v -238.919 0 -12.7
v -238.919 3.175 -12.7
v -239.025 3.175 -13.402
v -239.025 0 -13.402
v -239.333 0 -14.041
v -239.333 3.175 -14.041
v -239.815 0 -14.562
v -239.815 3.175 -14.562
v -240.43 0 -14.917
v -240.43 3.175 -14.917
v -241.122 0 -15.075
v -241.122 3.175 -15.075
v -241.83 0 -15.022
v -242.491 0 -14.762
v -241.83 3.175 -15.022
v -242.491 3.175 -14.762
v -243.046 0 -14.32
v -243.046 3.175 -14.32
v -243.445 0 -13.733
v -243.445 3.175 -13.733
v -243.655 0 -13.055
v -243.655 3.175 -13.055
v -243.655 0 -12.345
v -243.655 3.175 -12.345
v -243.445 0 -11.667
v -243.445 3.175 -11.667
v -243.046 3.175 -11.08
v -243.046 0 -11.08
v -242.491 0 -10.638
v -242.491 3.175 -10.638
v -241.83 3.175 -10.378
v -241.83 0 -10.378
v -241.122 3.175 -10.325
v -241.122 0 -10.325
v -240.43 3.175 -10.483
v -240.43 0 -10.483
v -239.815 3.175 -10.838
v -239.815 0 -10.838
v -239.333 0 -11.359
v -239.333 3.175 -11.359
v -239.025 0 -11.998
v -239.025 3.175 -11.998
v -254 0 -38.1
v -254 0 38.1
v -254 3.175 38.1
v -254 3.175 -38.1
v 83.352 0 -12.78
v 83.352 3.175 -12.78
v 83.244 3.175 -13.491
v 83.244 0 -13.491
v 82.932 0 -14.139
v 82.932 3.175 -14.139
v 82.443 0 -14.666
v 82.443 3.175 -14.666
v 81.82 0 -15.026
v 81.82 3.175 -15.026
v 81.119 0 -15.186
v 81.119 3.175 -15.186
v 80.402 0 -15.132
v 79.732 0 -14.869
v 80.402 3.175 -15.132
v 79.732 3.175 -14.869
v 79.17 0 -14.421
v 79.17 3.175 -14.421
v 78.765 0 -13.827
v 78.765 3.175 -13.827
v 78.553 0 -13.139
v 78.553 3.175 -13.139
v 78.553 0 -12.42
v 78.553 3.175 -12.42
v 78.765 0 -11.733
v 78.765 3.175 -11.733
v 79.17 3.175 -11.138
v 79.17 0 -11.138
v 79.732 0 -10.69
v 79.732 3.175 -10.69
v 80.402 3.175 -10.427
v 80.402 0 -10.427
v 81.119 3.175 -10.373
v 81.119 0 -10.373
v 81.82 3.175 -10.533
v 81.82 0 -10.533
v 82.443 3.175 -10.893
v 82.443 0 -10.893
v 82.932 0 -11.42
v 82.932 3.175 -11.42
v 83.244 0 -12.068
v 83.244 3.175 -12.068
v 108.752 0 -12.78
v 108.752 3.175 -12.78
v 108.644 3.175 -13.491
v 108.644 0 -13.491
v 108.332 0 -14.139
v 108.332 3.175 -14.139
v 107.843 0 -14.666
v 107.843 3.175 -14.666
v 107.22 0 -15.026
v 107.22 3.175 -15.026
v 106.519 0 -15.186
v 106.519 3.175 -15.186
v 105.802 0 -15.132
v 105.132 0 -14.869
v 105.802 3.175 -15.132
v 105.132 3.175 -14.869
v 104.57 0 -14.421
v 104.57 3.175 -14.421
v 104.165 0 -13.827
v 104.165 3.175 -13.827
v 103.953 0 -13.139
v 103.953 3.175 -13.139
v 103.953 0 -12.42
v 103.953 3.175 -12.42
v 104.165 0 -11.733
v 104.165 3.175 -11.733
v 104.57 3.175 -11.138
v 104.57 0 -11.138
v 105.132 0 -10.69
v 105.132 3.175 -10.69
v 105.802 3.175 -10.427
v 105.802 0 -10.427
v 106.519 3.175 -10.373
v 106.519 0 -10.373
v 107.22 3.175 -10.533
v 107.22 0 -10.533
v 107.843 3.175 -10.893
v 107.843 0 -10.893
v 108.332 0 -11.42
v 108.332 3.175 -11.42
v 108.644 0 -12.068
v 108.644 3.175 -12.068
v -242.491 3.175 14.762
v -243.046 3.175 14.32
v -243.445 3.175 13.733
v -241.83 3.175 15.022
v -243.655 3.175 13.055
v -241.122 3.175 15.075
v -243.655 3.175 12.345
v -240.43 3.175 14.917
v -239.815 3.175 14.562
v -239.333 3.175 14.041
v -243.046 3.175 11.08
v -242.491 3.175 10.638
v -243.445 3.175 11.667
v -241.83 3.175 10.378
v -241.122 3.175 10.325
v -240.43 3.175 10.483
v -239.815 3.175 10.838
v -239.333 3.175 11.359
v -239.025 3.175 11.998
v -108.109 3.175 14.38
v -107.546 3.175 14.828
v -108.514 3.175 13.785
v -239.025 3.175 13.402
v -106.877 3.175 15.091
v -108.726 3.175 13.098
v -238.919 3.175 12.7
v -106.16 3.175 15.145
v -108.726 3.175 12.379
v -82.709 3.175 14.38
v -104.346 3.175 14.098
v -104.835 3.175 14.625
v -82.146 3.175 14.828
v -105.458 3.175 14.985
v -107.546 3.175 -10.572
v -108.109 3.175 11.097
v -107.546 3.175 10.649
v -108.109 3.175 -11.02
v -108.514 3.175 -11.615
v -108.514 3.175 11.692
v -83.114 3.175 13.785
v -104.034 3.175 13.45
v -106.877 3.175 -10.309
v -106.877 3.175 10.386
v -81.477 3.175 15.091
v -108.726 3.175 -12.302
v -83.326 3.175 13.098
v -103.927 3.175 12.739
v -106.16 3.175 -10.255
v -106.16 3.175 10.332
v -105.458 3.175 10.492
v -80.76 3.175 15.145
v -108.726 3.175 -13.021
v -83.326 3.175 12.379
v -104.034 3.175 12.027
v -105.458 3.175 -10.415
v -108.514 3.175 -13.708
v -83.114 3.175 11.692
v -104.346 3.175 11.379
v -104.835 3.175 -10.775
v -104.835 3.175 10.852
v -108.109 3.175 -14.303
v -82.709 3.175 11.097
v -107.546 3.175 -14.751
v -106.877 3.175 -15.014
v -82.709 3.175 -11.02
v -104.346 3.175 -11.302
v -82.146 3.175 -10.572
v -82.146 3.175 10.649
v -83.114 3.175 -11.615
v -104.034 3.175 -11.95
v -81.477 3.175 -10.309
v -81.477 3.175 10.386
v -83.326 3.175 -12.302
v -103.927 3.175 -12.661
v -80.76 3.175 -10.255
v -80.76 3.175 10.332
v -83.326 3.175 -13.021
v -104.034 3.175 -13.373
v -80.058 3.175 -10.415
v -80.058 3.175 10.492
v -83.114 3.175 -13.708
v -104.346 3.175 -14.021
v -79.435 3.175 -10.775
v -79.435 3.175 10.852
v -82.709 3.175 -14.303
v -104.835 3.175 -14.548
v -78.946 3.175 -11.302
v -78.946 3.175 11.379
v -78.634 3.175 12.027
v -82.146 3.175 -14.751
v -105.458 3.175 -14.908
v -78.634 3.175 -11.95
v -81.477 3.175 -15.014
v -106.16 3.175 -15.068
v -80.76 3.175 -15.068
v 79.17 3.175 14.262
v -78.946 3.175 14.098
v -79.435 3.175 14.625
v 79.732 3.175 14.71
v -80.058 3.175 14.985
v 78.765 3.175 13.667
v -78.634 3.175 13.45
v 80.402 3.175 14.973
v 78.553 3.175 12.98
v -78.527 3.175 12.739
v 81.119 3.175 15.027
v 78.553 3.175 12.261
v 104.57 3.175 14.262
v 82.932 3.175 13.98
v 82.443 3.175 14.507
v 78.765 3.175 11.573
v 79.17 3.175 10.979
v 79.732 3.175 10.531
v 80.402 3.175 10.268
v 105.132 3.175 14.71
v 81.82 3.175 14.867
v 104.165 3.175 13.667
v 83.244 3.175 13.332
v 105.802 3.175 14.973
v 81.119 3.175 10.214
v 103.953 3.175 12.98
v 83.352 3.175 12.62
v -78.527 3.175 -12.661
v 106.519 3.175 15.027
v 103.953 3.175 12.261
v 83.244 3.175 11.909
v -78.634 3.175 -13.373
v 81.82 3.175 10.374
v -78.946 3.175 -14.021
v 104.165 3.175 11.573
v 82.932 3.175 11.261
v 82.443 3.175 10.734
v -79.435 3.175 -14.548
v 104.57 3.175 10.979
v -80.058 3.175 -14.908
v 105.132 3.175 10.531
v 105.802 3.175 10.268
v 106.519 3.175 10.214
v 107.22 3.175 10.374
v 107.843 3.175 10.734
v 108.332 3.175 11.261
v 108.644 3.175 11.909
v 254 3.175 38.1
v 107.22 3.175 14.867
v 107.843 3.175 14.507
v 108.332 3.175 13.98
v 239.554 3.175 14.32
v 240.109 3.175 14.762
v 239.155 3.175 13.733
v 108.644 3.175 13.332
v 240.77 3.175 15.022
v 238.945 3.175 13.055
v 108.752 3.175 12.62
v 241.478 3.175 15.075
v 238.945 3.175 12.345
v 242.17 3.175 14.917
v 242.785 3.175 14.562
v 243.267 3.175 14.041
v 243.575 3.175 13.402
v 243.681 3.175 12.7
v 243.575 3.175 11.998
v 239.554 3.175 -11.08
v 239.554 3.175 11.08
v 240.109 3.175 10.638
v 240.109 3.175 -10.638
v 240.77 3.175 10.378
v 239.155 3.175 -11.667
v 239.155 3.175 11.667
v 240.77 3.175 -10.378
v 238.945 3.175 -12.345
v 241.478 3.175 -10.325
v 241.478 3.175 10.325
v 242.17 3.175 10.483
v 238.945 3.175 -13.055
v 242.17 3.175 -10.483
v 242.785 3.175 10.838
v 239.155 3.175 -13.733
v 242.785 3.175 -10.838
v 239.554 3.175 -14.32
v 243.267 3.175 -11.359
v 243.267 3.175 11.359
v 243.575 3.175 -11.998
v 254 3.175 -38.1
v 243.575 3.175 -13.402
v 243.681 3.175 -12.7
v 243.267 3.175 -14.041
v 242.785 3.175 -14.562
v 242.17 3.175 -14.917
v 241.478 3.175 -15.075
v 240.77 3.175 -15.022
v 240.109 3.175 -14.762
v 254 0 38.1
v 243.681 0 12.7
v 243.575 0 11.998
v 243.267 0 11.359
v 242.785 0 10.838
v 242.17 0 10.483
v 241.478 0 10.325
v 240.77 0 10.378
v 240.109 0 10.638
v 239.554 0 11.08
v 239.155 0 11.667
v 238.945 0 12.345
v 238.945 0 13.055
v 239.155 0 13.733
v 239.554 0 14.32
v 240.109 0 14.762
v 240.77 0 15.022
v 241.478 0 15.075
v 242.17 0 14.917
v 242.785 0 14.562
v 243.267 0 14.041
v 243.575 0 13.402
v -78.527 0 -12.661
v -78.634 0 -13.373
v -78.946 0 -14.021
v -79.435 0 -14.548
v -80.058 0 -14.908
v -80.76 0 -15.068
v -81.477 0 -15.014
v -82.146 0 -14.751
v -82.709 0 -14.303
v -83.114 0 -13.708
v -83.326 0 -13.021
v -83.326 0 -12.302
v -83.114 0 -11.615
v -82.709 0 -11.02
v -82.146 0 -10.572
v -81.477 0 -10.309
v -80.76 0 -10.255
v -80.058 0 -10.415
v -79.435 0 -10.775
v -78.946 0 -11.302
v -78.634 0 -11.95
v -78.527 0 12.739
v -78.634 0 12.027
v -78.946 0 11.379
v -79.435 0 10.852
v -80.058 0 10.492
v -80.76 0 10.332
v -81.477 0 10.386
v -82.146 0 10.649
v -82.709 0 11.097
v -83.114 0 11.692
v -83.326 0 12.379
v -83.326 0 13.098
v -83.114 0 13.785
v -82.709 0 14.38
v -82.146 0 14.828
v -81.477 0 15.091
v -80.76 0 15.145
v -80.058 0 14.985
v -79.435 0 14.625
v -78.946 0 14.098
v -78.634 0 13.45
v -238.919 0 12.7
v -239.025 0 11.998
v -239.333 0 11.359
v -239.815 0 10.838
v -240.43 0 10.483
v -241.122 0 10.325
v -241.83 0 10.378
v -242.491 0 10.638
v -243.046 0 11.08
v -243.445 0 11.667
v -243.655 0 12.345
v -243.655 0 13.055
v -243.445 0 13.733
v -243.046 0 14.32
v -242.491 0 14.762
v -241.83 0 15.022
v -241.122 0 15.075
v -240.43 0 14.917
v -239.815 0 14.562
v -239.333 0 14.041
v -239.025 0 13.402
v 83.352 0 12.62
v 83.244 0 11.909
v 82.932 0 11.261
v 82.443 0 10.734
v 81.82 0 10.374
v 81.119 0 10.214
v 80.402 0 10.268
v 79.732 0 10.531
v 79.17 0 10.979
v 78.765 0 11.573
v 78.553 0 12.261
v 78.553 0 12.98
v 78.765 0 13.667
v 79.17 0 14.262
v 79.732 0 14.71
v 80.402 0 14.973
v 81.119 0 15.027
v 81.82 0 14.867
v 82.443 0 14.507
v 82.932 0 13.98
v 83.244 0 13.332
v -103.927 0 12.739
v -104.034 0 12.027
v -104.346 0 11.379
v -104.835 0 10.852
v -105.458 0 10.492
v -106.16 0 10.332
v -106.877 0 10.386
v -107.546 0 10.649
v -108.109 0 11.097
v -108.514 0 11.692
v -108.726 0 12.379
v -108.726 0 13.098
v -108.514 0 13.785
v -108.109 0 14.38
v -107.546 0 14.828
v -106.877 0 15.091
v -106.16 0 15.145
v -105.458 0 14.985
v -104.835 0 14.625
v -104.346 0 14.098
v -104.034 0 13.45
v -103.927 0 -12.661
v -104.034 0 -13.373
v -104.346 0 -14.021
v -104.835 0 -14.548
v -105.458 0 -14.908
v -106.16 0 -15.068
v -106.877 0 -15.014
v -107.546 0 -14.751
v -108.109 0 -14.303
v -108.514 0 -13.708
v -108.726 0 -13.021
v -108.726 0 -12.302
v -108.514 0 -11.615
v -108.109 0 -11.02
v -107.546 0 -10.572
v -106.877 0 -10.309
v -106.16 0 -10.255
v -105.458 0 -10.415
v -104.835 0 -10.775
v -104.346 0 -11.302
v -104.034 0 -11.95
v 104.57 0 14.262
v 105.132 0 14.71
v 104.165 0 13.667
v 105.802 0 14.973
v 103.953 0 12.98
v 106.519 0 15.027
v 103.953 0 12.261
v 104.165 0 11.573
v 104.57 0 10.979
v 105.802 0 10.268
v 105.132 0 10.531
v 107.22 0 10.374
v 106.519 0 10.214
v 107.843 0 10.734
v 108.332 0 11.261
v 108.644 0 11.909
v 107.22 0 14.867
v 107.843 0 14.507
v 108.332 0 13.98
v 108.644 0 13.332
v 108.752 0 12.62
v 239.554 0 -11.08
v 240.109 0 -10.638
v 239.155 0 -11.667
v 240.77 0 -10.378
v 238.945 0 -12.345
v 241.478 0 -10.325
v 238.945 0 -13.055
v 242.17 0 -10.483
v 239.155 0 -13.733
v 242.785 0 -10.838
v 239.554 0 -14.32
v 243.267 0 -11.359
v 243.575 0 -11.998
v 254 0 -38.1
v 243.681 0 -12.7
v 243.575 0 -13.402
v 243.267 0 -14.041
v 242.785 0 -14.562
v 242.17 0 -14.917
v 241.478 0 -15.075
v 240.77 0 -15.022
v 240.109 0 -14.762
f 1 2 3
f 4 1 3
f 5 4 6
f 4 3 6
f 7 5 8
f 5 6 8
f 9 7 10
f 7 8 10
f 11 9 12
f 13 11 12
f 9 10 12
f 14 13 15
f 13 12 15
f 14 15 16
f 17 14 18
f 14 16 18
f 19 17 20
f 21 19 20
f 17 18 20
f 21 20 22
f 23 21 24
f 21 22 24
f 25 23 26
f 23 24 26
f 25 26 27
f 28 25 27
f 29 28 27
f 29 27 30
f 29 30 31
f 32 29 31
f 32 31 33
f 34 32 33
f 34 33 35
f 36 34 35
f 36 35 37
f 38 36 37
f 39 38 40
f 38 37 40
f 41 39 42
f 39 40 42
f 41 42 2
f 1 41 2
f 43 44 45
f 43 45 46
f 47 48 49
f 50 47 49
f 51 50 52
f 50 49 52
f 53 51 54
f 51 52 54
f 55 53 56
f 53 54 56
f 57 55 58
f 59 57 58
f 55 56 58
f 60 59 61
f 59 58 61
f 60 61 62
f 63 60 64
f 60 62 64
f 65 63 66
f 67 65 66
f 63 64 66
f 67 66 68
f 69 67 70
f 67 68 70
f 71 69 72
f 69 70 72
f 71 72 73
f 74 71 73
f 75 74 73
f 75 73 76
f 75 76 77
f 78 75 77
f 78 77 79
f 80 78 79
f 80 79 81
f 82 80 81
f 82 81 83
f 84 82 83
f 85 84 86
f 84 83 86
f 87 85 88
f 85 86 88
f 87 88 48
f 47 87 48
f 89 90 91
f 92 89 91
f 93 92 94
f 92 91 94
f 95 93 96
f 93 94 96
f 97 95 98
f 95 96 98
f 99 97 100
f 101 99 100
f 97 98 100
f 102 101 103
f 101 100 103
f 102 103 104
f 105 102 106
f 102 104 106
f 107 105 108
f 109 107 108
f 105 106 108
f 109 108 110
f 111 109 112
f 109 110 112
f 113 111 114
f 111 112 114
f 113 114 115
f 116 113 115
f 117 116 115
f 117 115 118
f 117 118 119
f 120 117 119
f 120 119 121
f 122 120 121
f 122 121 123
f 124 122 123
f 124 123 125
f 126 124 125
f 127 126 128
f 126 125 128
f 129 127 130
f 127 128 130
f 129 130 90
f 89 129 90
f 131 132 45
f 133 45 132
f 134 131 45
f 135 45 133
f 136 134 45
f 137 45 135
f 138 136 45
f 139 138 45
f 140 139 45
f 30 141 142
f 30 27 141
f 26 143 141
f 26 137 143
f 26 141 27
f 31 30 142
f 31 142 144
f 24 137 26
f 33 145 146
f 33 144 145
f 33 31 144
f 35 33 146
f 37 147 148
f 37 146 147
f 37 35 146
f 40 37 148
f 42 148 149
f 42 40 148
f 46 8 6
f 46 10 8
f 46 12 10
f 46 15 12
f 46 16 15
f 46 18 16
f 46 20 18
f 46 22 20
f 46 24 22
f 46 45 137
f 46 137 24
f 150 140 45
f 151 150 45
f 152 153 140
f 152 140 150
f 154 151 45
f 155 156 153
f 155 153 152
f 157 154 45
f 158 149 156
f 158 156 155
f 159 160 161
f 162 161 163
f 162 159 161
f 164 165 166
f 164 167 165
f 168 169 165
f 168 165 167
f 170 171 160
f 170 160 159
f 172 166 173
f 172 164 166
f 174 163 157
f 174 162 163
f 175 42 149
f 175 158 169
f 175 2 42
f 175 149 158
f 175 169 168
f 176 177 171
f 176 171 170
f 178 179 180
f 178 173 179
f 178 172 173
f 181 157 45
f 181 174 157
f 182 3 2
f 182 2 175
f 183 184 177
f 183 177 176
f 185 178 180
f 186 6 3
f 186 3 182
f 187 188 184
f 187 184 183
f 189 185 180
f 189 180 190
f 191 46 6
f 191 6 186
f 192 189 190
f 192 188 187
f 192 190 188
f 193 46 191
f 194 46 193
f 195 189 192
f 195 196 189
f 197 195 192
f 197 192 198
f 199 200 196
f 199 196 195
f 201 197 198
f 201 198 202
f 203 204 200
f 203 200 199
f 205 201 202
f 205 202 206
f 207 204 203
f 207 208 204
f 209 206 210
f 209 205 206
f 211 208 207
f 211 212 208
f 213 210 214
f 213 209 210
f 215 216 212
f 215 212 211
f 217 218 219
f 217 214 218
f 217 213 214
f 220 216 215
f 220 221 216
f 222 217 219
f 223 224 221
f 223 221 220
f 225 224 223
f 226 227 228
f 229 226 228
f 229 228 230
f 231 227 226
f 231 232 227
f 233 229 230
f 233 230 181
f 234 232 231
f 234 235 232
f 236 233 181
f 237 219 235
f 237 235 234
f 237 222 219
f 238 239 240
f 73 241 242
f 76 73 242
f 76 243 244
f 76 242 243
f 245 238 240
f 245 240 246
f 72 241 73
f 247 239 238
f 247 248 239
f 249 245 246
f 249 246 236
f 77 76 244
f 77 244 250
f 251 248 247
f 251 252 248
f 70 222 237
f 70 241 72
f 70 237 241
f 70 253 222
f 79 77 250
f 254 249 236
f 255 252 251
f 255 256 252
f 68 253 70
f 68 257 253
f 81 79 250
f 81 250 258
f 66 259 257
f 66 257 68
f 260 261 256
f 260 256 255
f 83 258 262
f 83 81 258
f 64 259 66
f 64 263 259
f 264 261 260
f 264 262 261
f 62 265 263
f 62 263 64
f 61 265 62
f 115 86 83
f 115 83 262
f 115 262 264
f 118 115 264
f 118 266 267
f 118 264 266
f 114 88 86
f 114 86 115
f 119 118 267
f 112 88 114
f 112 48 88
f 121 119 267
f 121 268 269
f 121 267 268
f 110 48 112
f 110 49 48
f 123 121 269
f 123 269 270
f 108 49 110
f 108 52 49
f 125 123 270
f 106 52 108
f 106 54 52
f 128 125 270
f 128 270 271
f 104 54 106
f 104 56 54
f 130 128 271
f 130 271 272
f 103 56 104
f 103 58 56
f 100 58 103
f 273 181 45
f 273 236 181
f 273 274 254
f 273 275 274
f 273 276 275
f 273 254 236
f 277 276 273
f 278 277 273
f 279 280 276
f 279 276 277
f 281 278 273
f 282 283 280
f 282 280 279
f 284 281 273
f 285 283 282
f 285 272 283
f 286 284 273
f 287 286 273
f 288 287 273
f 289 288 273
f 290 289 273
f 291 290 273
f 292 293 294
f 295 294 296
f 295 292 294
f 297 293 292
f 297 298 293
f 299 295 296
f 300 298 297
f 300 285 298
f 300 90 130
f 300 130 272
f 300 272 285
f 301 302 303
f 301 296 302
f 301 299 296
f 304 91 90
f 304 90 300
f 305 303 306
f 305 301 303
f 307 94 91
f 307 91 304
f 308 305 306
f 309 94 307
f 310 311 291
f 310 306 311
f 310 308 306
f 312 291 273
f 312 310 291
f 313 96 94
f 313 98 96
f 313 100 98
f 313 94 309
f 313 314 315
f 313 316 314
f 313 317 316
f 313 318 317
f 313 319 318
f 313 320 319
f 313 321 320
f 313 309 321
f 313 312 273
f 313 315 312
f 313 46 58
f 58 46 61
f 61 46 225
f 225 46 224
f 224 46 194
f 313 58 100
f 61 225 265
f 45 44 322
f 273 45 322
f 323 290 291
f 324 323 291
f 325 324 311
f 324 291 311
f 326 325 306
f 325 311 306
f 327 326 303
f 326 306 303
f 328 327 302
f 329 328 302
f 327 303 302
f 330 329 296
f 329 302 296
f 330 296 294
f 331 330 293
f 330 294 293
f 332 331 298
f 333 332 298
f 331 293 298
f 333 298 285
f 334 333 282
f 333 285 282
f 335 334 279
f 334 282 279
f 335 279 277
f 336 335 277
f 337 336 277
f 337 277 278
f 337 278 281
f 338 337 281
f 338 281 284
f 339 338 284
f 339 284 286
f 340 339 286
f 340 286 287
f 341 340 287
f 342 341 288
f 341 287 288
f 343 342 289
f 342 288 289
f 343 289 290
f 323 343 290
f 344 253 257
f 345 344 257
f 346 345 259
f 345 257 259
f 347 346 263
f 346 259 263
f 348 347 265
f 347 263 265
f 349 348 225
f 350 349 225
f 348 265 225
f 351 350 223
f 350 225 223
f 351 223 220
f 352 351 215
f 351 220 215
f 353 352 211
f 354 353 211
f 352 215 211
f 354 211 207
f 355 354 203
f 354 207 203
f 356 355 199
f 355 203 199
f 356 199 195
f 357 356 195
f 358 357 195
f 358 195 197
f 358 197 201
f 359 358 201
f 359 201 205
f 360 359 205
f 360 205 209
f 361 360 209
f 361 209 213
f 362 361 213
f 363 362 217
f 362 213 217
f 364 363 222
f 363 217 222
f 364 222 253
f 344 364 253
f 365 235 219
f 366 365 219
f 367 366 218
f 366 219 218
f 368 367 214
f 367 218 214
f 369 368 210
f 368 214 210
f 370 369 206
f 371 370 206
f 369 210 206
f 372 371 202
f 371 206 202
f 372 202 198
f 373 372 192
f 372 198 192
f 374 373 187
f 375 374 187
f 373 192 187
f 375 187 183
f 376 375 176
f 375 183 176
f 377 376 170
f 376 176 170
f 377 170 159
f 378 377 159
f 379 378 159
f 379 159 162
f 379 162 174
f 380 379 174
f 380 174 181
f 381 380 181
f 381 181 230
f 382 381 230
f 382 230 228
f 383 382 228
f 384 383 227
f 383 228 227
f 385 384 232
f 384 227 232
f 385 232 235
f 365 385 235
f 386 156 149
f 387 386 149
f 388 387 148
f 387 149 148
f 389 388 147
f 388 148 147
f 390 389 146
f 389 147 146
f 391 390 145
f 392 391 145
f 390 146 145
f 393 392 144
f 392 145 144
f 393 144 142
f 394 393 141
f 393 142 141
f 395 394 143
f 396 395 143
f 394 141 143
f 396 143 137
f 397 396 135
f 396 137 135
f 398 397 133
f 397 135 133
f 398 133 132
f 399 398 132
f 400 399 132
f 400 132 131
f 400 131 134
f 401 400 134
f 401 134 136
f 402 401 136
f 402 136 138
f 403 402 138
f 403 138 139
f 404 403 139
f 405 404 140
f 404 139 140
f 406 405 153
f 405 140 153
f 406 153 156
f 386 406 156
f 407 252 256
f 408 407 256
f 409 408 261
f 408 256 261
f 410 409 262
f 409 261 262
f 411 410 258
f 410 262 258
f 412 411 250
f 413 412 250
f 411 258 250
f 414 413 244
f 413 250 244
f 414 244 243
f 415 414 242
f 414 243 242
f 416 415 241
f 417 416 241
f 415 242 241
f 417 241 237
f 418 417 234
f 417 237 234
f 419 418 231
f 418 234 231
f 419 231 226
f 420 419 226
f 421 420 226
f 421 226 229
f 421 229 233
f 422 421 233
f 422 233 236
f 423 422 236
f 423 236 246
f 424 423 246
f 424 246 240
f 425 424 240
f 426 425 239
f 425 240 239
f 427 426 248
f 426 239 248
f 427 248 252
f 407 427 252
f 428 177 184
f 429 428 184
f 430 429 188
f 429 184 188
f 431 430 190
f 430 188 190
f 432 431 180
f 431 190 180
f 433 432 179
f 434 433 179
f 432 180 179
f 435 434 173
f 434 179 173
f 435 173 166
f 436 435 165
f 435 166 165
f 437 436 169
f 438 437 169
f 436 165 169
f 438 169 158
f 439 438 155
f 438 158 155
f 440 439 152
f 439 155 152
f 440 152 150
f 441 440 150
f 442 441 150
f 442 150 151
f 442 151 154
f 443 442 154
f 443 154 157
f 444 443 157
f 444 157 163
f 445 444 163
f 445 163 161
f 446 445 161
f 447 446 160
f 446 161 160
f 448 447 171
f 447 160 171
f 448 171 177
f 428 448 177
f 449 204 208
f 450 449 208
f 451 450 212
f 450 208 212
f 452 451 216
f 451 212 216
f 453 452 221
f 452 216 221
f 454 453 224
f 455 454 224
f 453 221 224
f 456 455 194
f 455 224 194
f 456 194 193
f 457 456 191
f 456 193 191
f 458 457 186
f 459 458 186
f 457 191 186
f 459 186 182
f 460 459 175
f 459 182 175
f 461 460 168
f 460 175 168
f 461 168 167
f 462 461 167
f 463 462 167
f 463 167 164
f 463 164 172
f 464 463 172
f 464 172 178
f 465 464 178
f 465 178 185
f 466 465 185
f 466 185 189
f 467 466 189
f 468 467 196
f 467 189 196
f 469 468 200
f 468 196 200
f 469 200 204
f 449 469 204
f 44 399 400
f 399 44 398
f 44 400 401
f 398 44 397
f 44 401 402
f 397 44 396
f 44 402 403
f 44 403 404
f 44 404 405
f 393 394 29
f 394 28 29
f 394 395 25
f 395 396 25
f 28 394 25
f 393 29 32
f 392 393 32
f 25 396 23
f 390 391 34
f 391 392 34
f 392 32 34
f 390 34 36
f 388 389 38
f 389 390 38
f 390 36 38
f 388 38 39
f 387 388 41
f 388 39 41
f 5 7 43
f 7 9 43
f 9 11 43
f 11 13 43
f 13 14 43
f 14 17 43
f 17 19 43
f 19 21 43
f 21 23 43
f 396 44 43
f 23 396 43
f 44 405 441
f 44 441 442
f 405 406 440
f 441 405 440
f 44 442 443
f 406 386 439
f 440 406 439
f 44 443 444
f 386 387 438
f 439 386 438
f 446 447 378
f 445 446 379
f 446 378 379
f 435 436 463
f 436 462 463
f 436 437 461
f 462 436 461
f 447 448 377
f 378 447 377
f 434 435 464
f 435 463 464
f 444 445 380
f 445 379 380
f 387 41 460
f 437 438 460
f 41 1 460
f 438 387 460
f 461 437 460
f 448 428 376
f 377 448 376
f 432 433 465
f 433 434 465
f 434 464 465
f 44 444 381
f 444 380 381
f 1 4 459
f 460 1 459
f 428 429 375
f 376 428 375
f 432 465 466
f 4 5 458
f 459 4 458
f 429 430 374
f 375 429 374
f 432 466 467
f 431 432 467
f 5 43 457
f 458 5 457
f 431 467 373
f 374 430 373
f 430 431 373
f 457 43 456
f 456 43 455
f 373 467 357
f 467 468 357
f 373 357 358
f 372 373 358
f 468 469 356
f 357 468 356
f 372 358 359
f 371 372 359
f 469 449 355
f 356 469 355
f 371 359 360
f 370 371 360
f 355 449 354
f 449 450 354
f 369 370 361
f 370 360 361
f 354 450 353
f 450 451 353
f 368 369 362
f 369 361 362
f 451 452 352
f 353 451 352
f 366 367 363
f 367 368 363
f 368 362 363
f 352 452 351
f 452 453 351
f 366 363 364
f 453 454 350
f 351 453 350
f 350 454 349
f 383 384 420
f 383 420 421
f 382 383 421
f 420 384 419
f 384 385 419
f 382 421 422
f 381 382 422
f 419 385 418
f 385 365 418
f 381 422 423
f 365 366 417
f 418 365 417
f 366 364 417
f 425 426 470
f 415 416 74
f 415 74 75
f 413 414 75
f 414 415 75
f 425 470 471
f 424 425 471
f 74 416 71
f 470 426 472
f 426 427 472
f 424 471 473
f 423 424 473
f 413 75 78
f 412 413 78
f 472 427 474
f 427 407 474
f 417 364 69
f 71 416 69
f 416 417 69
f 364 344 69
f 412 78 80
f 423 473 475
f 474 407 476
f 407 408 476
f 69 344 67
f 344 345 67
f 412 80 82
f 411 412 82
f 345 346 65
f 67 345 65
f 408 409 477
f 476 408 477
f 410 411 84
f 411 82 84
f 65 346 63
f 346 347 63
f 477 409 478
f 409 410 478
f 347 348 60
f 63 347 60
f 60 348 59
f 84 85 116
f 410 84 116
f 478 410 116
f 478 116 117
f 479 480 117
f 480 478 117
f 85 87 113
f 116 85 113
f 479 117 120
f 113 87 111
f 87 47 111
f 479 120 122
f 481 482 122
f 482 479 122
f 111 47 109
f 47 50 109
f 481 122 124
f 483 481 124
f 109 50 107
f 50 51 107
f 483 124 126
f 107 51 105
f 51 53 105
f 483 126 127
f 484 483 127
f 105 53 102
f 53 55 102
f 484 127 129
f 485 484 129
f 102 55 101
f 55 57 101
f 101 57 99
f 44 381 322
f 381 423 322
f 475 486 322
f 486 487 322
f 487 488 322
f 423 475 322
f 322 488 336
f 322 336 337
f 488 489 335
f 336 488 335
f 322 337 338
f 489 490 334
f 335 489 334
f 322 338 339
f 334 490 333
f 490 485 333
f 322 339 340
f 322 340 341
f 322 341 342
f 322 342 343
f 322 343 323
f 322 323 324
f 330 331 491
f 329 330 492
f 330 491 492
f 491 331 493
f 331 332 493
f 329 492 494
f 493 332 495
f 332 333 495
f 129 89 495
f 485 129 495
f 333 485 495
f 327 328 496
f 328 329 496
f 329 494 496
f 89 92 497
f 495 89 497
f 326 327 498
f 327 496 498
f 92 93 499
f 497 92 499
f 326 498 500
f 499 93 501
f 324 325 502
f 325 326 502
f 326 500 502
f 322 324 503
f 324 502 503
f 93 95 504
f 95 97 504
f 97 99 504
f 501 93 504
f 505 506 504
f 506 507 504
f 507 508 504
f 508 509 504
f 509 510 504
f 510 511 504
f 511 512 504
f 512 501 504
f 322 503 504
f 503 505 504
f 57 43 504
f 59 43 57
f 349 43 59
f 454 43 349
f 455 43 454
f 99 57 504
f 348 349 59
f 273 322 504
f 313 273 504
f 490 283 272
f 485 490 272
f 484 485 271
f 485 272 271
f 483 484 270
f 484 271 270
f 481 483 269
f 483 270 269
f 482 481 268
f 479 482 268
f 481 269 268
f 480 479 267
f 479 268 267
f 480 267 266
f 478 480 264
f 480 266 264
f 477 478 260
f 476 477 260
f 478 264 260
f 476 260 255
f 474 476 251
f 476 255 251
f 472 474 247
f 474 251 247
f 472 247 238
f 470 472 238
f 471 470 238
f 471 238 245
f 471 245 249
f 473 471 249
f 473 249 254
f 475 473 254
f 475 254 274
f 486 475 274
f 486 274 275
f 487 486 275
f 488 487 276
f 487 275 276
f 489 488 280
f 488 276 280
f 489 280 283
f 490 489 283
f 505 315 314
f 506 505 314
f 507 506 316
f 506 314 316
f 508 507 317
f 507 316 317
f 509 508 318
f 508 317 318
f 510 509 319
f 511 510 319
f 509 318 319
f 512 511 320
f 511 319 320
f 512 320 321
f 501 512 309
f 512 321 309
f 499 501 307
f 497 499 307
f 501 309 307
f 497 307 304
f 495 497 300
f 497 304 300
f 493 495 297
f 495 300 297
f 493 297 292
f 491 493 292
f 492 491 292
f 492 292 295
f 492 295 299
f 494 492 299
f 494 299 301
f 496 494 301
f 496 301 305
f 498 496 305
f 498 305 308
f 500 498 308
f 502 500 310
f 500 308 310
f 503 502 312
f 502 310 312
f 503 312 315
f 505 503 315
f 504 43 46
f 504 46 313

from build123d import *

# Parameters (mm, degrees)
SKETCH1_W           = 508
SKETCH1_H           = 76.2
BOSS_EXTRUDE1_DEPTH = 3.175
SKETCH2_R           = 2.413
CUT_EXTRUDE1_DEPTH  = 3.175
SKETCH3_R           = 2.38125
CUT_EXTRUDE2_DEPTH  = 3.175


with BuildPart() as part:
    # Sketch1 → Boss-Extrude1 (new body)
    with BuildSketch(Plane(origin=(0, 0, 0), x_dir=(1, 0, 0), z_dir=(0, 1, 0))):
        Rectangle(SKETCH1_W, SKETCH1_H)
    extrude(amount=BOSS_EXTRUDE1_DEPTH)

    # Sketch2 → Cut-Extrude1 (cut)
    with BuildSketch(Plane(origin=(0, 3.175, 0), x_dir=(1, 0, 0), z_dir=(0, 1, 0))):
        with Locations((-106.339909649, -12.738500789)):
            Circle(SKETCH2_R)
        with Locations((-106.339909649, 12.661499211)):
            Circle(SKETCH2_R)
        with Locations((-80.939909649, 12.661499211)):
            Circle(SKETCH2_R)
        with Locations((-80.939909649, -12.738500789)):
            Circle(SKETCH2_R)
        with Locations((106.338702735, -12.620374528)):
            Circle(SKETCH2_R)
        with Locations((106.338702735, 12.779625472)):
            Circle(SKETCH2_R)
        with Locations((80.938702735, 12.779625472)):
            Circle(SKETCH2_R)
        with Locations((80.938702735, -12.620374528)):
            Circle(SKETCH2_R)
    extrude(amount=-CUT_EXTRUDE1_DEPTH, mode=Mode.SUBTRACT)

    # Sketch3 → Cut-Extrude2 (cut)
    with BuildSketch(Plane(origin=(0, 3.175, 0), x_dir=(1, 0, 0), z_dir=(0, 1, 0))):
        with Locations((-241.3, 12.7)):
            Circle(SKETCH3_R)
        with Locations((-241.3, -12.7)):
            Circle(SKETCH3_R)
        with Locations((241.3, -12.7)):
            Circle(SKETCH3_R)
        with Locations((241.3, 12.7)):
            Circle(SKETCH3_R)
    extrude(amount=-CUT_EXTRUDE2_DEPTH, mode=Mode.SUBTRACT)


solid = part.part
